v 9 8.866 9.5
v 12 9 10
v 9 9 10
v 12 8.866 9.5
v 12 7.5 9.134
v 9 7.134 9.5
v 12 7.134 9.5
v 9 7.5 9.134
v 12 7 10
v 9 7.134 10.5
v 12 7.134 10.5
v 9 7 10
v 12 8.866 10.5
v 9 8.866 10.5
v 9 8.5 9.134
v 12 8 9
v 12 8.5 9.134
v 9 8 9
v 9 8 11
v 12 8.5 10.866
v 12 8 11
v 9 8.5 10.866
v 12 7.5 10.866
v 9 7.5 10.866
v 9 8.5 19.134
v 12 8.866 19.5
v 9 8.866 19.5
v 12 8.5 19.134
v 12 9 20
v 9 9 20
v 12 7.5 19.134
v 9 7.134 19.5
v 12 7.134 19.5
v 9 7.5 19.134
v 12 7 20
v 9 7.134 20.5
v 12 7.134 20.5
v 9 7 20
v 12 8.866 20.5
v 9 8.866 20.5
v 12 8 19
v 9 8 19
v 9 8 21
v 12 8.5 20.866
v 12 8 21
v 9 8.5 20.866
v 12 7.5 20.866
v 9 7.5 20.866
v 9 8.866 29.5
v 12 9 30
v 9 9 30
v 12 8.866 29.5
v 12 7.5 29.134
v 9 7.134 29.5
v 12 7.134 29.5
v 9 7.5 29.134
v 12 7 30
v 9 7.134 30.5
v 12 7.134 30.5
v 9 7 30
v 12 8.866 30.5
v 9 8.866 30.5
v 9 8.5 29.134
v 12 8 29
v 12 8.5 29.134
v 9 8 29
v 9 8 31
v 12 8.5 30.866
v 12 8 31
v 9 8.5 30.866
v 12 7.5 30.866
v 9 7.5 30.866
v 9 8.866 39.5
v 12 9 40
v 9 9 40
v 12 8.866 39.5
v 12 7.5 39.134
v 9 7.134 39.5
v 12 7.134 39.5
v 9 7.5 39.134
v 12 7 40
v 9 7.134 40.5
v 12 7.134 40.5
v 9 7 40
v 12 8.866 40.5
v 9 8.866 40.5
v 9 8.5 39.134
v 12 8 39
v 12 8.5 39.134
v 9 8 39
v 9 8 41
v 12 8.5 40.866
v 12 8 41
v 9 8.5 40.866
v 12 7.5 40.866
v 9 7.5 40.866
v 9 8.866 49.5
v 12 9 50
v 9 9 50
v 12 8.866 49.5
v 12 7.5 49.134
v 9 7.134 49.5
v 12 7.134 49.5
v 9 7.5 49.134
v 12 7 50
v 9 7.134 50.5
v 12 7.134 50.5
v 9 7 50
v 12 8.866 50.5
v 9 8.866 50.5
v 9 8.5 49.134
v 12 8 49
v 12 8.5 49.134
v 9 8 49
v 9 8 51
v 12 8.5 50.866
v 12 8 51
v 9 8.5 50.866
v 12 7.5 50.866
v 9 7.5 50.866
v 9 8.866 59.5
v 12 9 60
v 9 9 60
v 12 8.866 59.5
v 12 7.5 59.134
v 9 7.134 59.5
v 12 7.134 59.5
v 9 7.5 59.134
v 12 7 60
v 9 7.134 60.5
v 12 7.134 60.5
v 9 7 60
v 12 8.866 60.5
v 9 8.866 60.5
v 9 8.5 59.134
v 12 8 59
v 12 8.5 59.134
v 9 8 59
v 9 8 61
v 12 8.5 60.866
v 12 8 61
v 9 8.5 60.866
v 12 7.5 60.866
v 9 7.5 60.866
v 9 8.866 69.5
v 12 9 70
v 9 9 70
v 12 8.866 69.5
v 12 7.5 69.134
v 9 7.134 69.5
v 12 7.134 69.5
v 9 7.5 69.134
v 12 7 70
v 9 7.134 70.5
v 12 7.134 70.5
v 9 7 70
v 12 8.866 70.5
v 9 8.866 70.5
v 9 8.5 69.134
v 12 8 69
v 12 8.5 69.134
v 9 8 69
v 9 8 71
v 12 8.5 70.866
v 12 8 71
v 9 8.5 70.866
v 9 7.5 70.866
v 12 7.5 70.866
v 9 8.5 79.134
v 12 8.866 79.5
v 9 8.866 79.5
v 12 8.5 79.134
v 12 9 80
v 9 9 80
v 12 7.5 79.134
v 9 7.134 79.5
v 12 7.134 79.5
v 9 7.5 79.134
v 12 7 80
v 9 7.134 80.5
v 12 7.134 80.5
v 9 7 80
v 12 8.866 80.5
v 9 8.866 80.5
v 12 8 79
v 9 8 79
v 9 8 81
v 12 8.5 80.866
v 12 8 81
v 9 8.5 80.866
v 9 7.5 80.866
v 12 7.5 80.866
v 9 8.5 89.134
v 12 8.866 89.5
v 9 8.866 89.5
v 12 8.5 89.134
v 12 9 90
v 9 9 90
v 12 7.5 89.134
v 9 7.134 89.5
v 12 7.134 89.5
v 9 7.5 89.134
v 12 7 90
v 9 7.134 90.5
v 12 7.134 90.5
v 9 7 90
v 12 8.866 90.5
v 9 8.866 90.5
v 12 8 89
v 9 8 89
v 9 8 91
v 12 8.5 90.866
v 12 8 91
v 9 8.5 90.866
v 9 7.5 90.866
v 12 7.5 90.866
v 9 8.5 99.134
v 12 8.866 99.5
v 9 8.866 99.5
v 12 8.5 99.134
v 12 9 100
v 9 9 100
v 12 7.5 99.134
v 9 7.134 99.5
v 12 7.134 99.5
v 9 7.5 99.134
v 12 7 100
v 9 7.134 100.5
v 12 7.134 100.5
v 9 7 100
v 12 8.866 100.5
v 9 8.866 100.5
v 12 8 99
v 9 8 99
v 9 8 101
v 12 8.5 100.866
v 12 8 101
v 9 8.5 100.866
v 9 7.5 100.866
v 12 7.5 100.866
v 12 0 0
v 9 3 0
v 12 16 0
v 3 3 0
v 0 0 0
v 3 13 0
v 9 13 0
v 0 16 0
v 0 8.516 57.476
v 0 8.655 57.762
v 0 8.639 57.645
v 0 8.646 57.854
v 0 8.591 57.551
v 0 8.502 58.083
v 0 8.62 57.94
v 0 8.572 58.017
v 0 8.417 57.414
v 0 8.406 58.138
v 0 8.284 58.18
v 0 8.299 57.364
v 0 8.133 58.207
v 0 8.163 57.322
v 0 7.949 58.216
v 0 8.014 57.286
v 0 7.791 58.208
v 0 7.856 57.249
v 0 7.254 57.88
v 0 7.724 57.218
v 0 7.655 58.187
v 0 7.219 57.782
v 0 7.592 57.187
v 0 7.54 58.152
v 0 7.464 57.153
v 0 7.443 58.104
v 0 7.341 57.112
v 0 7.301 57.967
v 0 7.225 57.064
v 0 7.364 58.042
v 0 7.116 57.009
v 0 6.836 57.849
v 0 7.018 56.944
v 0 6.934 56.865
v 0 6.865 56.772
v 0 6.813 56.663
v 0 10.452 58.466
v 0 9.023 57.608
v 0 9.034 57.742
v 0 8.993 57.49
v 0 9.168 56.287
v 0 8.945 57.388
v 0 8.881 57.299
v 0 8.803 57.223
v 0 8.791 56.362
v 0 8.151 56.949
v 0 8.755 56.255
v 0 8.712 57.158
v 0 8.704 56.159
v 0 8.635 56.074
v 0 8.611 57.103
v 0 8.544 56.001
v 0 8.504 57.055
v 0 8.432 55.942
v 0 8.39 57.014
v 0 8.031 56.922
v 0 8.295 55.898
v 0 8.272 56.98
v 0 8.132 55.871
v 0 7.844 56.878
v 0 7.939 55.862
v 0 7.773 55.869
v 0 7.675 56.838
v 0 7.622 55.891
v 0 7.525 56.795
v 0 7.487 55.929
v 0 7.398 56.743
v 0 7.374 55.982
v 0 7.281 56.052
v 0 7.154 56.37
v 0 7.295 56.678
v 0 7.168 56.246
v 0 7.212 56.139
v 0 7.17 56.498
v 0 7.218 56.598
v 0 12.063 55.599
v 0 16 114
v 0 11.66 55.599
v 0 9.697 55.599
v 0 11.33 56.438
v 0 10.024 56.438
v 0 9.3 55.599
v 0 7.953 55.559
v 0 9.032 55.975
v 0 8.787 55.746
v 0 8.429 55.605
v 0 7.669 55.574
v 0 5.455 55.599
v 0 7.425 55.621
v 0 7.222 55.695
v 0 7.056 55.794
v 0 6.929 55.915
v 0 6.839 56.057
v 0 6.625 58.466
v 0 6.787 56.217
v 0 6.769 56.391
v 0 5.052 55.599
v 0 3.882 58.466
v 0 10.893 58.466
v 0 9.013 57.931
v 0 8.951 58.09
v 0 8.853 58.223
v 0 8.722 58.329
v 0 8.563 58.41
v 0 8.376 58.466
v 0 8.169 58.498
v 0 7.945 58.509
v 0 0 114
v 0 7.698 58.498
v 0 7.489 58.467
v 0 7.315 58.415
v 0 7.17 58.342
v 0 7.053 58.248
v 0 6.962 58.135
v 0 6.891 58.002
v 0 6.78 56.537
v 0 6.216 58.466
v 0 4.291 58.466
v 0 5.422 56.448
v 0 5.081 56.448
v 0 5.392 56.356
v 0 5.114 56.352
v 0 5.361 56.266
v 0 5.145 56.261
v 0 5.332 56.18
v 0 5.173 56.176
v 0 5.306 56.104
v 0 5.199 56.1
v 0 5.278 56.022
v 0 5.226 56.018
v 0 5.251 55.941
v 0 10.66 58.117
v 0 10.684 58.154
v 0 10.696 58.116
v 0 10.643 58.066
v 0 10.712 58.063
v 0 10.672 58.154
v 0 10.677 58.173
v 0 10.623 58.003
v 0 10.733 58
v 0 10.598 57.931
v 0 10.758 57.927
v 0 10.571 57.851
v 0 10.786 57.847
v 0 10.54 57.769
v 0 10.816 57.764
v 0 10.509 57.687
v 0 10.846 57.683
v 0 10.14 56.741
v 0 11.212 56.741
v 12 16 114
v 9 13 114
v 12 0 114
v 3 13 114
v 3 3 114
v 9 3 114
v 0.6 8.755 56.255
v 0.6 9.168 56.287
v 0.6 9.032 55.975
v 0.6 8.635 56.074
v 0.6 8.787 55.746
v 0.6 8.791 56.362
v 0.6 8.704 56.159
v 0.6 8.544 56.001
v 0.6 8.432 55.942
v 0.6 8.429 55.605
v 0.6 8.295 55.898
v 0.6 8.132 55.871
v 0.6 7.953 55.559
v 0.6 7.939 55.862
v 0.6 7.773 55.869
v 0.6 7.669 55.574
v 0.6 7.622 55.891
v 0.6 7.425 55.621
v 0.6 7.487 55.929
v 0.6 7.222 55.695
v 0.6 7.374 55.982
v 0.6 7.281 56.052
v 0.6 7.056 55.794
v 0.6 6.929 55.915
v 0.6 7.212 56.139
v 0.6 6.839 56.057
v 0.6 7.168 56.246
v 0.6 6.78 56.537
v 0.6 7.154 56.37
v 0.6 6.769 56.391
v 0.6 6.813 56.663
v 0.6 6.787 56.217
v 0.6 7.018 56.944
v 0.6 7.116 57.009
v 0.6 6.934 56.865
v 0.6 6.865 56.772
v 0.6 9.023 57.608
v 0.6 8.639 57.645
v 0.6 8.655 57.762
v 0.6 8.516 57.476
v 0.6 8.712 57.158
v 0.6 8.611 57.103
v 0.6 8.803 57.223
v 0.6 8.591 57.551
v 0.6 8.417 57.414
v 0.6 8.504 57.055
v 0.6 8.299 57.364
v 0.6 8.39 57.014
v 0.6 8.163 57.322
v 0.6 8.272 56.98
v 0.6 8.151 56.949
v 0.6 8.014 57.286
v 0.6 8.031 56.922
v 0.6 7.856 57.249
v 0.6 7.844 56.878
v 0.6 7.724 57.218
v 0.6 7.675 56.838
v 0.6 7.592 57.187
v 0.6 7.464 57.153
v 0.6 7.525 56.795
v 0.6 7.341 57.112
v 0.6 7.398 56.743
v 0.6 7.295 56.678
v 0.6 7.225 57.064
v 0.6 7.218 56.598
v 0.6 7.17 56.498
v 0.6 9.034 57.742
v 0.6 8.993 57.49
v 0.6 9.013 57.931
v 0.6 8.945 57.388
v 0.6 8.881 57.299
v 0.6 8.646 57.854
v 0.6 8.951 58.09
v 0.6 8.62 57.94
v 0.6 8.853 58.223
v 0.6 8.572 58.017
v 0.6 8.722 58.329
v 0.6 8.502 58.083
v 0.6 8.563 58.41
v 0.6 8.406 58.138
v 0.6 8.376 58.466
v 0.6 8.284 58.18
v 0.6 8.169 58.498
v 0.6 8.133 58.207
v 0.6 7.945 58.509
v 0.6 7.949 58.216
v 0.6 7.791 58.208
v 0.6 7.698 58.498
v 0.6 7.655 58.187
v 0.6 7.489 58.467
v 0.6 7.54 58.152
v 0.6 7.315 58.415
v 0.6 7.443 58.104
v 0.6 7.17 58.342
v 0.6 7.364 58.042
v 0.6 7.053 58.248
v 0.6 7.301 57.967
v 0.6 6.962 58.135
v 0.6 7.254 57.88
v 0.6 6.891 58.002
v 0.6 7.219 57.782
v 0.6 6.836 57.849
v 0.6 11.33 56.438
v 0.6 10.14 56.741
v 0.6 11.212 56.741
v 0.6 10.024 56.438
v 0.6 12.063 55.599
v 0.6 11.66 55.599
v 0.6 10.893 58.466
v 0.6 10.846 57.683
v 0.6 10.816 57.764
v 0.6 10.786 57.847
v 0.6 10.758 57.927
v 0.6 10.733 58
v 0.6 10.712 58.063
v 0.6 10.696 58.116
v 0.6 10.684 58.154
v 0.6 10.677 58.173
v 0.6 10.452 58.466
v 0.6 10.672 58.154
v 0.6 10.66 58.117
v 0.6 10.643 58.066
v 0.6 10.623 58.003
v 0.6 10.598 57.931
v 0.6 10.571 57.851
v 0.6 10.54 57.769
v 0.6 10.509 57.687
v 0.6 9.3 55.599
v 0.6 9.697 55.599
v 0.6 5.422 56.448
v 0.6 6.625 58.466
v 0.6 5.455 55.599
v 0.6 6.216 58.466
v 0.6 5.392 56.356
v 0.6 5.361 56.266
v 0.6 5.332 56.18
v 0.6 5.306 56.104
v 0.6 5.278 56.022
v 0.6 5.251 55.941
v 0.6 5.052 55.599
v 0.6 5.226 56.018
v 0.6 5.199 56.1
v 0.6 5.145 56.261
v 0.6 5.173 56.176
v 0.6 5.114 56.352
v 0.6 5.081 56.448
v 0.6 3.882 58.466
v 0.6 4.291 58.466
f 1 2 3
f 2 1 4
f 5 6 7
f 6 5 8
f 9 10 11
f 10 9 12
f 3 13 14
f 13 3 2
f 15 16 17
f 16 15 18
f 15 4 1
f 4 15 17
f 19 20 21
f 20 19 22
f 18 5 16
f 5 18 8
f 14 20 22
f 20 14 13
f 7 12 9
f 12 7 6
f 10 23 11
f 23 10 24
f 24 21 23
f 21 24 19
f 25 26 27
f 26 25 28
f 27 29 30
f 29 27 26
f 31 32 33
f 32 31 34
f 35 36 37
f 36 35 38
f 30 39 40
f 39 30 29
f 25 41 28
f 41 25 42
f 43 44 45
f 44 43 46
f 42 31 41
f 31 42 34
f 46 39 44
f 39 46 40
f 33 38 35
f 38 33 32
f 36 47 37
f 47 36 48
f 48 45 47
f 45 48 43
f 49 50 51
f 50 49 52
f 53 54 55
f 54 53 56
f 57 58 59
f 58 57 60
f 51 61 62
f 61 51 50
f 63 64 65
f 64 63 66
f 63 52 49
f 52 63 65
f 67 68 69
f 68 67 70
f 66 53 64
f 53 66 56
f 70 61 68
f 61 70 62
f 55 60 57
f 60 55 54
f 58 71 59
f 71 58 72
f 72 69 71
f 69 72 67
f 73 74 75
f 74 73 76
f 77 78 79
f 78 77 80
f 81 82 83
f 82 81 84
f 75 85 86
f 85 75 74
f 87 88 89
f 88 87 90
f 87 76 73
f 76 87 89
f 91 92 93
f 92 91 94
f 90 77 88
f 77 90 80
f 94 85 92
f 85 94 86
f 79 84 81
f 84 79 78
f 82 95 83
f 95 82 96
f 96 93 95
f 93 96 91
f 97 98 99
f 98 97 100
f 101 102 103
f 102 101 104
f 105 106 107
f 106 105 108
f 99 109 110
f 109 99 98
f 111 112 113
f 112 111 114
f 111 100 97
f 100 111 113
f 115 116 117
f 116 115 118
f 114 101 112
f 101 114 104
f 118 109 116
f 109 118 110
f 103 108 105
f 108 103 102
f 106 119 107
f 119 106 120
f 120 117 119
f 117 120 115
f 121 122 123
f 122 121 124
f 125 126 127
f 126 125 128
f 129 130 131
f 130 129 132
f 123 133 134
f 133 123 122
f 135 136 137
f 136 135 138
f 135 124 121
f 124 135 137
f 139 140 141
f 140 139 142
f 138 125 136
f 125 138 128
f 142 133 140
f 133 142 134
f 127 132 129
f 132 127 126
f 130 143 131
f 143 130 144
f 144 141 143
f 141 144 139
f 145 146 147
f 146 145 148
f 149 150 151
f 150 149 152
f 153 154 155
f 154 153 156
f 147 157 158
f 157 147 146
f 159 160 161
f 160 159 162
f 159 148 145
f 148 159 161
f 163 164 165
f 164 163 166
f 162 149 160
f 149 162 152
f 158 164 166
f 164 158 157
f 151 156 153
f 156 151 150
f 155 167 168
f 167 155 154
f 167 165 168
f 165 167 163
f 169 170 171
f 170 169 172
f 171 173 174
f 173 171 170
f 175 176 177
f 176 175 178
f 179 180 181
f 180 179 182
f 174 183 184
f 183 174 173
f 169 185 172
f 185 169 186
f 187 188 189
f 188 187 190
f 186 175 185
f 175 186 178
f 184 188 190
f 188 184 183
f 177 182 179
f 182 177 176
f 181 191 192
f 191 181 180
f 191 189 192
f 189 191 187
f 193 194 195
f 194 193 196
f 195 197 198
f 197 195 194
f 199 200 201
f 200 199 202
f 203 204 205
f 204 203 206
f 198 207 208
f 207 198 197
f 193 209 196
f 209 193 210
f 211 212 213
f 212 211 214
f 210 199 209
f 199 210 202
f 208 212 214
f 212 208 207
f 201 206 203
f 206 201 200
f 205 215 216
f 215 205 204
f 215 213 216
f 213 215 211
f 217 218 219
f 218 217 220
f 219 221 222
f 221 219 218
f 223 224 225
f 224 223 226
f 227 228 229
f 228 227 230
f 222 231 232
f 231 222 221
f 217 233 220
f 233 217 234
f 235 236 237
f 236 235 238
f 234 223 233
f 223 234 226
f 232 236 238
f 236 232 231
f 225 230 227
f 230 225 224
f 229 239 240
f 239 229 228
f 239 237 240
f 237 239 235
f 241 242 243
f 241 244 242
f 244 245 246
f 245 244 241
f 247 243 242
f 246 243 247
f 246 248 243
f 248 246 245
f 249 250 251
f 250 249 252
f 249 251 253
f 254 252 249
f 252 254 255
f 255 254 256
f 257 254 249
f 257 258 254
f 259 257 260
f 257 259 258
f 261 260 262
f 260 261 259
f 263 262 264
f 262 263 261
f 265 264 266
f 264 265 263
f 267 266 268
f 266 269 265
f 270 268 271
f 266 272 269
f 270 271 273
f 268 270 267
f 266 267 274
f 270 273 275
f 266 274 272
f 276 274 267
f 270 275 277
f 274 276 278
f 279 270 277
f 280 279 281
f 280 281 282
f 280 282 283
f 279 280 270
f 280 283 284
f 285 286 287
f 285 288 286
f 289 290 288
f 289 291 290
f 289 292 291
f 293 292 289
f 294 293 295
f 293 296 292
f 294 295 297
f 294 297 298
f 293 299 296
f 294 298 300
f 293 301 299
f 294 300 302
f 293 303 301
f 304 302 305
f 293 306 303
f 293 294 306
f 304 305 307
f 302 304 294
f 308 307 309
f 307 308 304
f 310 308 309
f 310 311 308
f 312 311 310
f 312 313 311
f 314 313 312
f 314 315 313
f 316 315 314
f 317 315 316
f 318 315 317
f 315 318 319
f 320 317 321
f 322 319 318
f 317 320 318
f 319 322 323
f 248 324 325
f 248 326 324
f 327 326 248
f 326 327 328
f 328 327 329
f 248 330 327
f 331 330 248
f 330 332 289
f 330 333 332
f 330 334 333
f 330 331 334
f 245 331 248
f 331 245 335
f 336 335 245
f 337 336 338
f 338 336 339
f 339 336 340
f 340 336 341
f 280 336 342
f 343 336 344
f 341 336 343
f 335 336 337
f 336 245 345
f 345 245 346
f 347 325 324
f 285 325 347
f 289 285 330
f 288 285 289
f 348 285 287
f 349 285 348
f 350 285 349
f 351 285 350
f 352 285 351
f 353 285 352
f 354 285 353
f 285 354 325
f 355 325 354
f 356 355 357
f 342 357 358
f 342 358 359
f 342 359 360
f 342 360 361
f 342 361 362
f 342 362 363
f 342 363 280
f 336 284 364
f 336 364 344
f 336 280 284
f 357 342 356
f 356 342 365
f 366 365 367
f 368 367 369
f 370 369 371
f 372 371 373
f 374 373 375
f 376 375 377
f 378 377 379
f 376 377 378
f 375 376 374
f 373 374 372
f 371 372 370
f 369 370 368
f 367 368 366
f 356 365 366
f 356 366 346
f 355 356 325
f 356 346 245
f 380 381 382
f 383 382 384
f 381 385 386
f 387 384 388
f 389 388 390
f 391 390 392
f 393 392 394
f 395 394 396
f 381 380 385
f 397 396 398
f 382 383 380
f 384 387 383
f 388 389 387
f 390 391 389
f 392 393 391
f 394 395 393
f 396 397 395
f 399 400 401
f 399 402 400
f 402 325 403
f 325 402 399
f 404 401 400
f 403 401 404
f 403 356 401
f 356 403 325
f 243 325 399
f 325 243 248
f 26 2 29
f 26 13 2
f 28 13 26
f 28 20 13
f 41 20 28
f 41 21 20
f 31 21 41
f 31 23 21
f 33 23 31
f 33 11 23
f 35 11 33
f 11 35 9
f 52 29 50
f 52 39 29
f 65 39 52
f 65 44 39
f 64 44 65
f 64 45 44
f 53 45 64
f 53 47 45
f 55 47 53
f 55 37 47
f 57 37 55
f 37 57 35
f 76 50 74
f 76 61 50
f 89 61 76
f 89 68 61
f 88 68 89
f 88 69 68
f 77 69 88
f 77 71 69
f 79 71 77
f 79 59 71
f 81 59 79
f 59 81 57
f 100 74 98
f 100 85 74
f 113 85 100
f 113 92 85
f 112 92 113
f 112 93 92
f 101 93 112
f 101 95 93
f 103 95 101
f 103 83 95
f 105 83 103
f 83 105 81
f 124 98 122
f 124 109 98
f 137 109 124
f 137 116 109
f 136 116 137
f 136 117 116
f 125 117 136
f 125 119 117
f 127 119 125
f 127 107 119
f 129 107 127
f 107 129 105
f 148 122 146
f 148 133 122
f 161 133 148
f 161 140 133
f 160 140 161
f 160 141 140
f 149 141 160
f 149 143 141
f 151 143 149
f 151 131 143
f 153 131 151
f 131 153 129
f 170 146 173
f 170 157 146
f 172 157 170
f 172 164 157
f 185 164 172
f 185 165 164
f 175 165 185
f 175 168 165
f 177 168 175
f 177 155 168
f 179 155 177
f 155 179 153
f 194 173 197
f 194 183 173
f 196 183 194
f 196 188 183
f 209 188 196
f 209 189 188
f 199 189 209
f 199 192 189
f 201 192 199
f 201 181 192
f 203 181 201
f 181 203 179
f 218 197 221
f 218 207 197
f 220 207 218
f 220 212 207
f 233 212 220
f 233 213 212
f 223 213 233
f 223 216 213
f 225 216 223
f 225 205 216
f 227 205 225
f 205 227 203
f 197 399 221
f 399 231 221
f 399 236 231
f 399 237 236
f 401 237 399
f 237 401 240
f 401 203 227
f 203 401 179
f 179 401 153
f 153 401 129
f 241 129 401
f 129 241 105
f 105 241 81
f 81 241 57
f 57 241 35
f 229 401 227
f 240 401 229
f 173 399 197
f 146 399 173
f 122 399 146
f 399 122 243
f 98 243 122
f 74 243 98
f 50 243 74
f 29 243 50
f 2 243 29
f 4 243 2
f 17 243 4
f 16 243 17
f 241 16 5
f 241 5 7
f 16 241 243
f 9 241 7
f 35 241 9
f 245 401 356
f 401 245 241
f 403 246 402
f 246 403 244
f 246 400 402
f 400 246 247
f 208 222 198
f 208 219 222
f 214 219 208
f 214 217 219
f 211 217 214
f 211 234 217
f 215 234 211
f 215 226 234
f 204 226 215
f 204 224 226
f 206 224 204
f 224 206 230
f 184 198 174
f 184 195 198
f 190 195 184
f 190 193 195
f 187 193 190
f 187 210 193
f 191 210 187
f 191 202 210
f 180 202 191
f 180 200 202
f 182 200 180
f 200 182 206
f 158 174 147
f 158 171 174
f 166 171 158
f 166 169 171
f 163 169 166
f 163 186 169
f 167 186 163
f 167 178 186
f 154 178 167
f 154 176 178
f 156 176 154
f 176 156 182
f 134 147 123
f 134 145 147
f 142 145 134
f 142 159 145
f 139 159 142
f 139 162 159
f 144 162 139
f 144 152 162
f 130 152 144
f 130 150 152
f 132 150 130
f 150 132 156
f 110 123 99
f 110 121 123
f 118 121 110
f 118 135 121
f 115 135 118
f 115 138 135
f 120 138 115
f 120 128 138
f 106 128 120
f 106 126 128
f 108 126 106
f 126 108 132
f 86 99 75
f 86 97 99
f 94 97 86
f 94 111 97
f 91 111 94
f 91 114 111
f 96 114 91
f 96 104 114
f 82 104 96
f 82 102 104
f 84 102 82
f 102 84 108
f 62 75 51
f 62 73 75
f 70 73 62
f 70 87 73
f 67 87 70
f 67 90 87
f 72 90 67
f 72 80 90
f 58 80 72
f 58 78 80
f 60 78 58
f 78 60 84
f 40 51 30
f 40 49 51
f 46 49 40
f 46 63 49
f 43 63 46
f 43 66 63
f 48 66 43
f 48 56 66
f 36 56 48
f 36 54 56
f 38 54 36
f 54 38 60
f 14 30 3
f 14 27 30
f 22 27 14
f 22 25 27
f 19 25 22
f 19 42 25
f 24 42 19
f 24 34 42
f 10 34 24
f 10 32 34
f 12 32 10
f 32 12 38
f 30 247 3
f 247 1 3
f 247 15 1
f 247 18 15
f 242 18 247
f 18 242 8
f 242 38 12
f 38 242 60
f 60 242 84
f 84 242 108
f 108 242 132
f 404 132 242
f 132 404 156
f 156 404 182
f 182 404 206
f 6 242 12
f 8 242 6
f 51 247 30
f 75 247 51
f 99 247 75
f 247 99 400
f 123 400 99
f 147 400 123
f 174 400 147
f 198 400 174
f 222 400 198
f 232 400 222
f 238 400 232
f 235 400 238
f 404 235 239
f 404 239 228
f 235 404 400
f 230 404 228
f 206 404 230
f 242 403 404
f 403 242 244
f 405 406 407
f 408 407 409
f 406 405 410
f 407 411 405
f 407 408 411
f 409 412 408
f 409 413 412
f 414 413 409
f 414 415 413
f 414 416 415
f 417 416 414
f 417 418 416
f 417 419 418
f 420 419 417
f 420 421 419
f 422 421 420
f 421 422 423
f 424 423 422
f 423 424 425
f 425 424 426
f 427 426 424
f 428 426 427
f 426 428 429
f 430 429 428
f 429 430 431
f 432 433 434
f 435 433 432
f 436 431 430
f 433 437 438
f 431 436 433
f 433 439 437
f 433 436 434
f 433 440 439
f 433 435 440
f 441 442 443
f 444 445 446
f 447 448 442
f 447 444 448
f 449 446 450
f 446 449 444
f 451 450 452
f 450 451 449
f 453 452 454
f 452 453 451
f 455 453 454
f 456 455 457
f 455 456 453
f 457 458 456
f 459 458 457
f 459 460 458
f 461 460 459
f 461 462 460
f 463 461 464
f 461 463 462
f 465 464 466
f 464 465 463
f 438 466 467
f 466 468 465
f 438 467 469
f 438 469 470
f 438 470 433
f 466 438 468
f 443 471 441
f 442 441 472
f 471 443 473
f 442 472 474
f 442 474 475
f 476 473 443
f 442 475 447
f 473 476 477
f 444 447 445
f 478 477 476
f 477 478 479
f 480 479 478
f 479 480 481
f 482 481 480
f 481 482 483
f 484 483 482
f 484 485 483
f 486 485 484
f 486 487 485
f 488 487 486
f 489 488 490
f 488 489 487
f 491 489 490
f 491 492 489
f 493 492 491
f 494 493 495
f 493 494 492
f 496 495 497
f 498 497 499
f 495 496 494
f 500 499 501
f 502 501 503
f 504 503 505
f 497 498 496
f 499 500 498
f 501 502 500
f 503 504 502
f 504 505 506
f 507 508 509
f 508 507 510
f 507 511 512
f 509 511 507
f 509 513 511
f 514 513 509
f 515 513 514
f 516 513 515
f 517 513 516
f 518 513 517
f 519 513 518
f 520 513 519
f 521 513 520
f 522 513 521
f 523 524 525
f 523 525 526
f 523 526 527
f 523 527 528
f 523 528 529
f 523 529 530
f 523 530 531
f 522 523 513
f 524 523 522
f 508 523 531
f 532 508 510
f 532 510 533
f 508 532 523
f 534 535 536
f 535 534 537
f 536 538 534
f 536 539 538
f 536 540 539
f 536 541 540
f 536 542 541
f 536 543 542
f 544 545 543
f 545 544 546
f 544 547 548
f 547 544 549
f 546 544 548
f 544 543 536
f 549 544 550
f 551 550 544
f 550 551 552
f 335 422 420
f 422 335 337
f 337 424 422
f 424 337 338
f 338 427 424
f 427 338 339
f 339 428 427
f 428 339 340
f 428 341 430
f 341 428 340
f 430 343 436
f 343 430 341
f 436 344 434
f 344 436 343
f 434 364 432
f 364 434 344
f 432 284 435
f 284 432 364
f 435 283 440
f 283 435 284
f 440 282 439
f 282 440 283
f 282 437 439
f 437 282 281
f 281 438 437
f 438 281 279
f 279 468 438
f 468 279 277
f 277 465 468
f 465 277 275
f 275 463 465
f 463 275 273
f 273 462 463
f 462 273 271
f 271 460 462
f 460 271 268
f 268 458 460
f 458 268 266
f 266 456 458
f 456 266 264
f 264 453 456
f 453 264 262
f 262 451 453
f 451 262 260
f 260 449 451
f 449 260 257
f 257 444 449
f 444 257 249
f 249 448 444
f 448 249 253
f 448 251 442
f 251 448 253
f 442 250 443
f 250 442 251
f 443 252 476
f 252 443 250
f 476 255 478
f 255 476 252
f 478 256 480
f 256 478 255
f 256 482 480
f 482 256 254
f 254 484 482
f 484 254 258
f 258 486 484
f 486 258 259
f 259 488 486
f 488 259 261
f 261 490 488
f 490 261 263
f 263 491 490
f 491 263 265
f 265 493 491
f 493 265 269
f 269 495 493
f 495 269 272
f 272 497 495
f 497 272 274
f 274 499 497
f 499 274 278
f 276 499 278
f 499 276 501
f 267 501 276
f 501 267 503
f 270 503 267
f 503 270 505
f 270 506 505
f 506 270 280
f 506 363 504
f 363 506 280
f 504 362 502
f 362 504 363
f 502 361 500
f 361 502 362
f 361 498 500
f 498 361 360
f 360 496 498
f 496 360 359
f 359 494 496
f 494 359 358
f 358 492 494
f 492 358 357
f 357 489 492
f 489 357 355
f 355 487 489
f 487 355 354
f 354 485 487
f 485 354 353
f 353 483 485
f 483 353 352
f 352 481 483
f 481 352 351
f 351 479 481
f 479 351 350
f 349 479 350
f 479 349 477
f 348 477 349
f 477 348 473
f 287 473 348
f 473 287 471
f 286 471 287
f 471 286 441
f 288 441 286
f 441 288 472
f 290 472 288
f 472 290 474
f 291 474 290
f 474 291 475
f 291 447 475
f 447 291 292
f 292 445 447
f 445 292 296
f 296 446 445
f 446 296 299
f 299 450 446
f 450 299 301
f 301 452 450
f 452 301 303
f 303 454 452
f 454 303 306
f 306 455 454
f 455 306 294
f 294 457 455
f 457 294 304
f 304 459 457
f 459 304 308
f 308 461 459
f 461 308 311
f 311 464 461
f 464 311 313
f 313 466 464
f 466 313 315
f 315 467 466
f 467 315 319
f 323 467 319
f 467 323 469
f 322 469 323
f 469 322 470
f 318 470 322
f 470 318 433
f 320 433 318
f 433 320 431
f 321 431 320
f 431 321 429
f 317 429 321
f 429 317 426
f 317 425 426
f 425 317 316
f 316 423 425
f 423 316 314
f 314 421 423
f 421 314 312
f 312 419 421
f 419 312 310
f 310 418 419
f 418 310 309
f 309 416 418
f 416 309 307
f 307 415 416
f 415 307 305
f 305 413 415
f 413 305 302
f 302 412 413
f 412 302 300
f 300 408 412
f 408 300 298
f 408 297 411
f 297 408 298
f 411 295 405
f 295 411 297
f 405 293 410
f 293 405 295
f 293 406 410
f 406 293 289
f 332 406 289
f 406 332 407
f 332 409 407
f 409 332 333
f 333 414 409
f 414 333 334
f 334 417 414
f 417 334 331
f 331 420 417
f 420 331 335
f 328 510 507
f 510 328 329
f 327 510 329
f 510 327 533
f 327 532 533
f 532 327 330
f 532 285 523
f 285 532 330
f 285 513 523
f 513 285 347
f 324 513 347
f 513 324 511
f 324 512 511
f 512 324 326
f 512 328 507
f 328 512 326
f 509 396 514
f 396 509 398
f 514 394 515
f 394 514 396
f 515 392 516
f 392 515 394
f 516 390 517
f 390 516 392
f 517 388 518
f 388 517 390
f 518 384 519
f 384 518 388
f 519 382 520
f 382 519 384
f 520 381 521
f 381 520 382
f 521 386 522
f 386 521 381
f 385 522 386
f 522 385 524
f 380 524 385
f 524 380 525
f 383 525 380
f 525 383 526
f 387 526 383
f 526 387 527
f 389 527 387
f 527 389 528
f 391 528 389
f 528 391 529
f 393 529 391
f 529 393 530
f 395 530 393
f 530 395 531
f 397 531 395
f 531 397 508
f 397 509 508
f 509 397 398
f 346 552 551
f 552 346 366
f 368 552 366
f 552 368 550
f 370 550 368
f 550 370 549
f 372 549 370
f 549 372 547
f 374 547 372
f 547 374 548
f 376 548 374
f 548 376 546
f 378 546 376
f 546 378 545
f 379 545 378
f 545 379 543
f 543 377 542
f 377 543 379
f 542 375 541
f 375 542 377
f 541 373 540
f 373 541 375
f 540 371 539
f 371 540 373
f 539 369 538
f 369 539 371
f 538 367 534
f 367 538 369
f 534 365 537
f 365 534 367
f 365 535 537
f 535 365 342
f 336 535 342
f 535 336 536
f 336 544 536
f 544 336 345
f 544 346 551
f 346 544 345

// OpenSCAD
// file: ../../lib/emboss.scad
// cad/lib/emboss.scad
include <../generated/dims.scad>

module engrave(code, at, z, size = LABEL_SIZE, facing = -1, spin = 0) {
    if (facing < 0)
        translate([at[0] + LABEL_DEPTH, at[1], z]) rotate([90, 0, -90])
            linear_extrude(LABEL_DEPTH + 0.01) rotate(spin) text(code, size = size, halign = "center", valign = "center");
    else
        translate([at[0] - LABEL_DEPTH, at[1], z]) rotate([90, 0, 90])
            linear_extrude(LABEL_DEPTH + 0.01) rotate(-spin) text(code, size = size, halign = "center", valign = "center");
}
// file: ../dims.scad
MAX_SEG = 240.0;
JOINT_GAP = 1.0;
DEPTH = 63.0;
FRAME_W = 58.0;
FRAME_BODY = 40.0;
TRANSOM_W = 70.0;
TRANSOM_HALF_BODY = 17.0;
SASH_W = 51.0;
SASH_BODY = 33.0;
SASH_Y0 = 2.0;
SASH_GAP = 13.0;
STAY_W = 14.0;
SCREEN_W = 30.0;
SCREEN_DEPTH = 20.0;
SCREEN_OVERLAP = 10.0;
SCREEN_SHELL = 4.0;
GLASS_T = 24.0;
TWINWALL_T = 16.0;
GLASS_CLEAR = 3.0;
GASKET_T = 3.0;
GASKET_IN = 4.0;
GLASS_EDGE = 43.0;
TRANSOM_GLASS = 20.0;
SASH_GLASS = 36.0;
STOP_T = 8.0;
GLASS_Y0 = 11.0;
BEAD_W = 16.0;
BEAD_T = 10.0;
KEY_Y = 43.0;
KEY_D = 4.0;
KEY_H = 4.0;
KEY_LIP = 0.8;
KEY_THROAT = 1.2;
FIN_Y0 = 20.0;
FIN_Y1 = 28.0;
FIN_L = 8.0;
ISTOP_Y0 = 54.0;
FLANGE_Y1 = 17.0;
FLANGE_L = 11.0;
LIP_Y0 = 46.0;
LIP_Y1 = 52.0;
LIP_L = 8.0;
KERF_W = 3.0;
KERF_D = 5.0;
MAG_W = 13.0;
MAG_D = 2.0;
SPLINE_W = 4.0;
SPLINE_D = 5.0;
SPACER_W = 12.0;
ACRYLIC_T = 4.0;
SETTING_L = 100.0;
WEEP_CAP_H = 12.0;
WEEP_CAP_T = 1.5;
TUBE_FRAME = [20.0, 20.0];
TUBE_TRANSOM = [20.0, 40.0];
TUBE_SASH = [20.0, 20.0];
TUBE_SCREEN = [10.0, 10.0];
SOCKET_FRAME = 28.0;
SOCKET_SASH = 21.0;
SOCKET_SCREEN = 12.0;
TUBE_END_CLEAR = 1.5;
TUBE_CLEAR = 0.3;
MIN_SHELL = 6.0;
CHAMBER_WALL = 2.5;
MIN_SKIN = 1.5;
END_CAP = 4.0;
CORD_D = 3.0;
CORD_INSET = 1.5;
FIX_Y = 16.0;
FIX_Y_IN = 48.0;
FIX_DZ = 7.0;
FIX_D = 5.0;
FIX_CB_D = 10.0;
FIX_CB_L = 6.0;
FIX_BOSS_D = 15.0;
TUBE_SCREW_D = 4.2;
CSK_D = 8.6;
TRANSOM_SCREW_X = 39.0;
INSERT_M4_D = 5.6;
INSERT_M4_L = 8.0;
BOSS_PITCH = 24.0;
CAM_ALIGN_TOL = 1.0;
DOVE_W = 16.0;
DOVE_FLARE = 3.0;
DOVE_D = 6.0;
DOVE_CLEAR = 0.3;
LOCK_U = 3.0;
LOCK_D = 3.3;
LOCK_L = 22.0;
NODE_FIX_OFFSET = 25.0;
SHOE_WALL = 3.0;
HINGE_BOSS_X = 21.0;
CAM_BOSS_X = 47.0;
TRANSOM_MAG_X = 20.0;
LABEL_DEPTH = 0.6;
LABEL_SIZE = 5.0;
BEAD_LABEL = 3.0;
WEEP_W = 20.0;
WEEP_H = 5.0;
SILL_SLOPE_DEG = 8.0;
NOSE_KEY_X = 10.0;
NOSE_KEY_W = 6.0;
NOSE_KEY_D = 4.0;
NOSE_PROJECTION = 15.0;
MULLION_W = 70.0;
MULLION_HALF_BODY = 17.0;
MULLION_DOVE_D = 4.0;
VSLOT_SHIFT = 3.0;
VSLOT_MOUTH = 9.16;
VSLOT_NECK = 6.25;
VSLOT_LIP = 1.8;
VSLOT_FLOOR = 6.1;
VSLOT_SHOULDER = [5.6, 8.5];
VSLOT_TIP = [5.0, 5.8];
VSLOT_SCREW_D = 5.5;
VSLOT_CSK_D = 10.0;
VSLOT_M5_L = [10, 12, 16, 20, 25, 30, 35, 40];
VSLOT_TRANSOM_X = 41.25;
EDGE_R = 2.0;
JOINT_BEVEL = 0.8;
BEVEL_STEP = 0.2;
HANDLE_R = 3.0;
// file: ../../parts/acrylic_spacer.scad
// cad/parts/acrylic_spacer.scad
include <../generated/dims.scad>
use <../profile.scad>
use <../lib/emboss.scad>

function spacer_t(gap) = is_undef(gap) ? GLASS_T - 2 * ACRYLIC_T : gap;

module spacer_channel(gap) { rect(3, 3, SPACER_W - 3, spacer_t(gap) - 3); }

module acrylic_spacer(len, code, gap) {
    difference() {
        linear_extrude(len) rect(0, 0, SPACER_W, spacer_t(gap));
        translate([0, 0, -0.01]) linear_extrude(len + 0.02) spacer_channel(gap);
        for (z = [10 : 10 : len - 5])
            translate([SPACER_W - 3.5, spacer_t(gap) / 2, z]) rotate([0, 90, 0]) cylinder(d = 2, h = 4, $fn = 12);
        engrave(code, [0, spacer_t(gap) / 2], len / 2, 3);
    }
}

module acrylic_spacer_corner(code, gap) {
    leg = 15;
    plug = [SPACER_W - 6 - 0.3, spacer_t(gap) - 6 - 0.3];
    linear_extrude(spacer_t(gap)) square([SPACER_W, SPACER_W]);
    translate([SPACER_W, 3.15, 3.15]) cube([leg, plug[0], plug[1]]);
    translate([3.15, SPACER_W, 3.15]) cube([plug[0], leg, plug[1]]);
}
// main file
use <../../parts/acrylic_spacer.scad>
acrylic_spacer(114.0, "ASV");
